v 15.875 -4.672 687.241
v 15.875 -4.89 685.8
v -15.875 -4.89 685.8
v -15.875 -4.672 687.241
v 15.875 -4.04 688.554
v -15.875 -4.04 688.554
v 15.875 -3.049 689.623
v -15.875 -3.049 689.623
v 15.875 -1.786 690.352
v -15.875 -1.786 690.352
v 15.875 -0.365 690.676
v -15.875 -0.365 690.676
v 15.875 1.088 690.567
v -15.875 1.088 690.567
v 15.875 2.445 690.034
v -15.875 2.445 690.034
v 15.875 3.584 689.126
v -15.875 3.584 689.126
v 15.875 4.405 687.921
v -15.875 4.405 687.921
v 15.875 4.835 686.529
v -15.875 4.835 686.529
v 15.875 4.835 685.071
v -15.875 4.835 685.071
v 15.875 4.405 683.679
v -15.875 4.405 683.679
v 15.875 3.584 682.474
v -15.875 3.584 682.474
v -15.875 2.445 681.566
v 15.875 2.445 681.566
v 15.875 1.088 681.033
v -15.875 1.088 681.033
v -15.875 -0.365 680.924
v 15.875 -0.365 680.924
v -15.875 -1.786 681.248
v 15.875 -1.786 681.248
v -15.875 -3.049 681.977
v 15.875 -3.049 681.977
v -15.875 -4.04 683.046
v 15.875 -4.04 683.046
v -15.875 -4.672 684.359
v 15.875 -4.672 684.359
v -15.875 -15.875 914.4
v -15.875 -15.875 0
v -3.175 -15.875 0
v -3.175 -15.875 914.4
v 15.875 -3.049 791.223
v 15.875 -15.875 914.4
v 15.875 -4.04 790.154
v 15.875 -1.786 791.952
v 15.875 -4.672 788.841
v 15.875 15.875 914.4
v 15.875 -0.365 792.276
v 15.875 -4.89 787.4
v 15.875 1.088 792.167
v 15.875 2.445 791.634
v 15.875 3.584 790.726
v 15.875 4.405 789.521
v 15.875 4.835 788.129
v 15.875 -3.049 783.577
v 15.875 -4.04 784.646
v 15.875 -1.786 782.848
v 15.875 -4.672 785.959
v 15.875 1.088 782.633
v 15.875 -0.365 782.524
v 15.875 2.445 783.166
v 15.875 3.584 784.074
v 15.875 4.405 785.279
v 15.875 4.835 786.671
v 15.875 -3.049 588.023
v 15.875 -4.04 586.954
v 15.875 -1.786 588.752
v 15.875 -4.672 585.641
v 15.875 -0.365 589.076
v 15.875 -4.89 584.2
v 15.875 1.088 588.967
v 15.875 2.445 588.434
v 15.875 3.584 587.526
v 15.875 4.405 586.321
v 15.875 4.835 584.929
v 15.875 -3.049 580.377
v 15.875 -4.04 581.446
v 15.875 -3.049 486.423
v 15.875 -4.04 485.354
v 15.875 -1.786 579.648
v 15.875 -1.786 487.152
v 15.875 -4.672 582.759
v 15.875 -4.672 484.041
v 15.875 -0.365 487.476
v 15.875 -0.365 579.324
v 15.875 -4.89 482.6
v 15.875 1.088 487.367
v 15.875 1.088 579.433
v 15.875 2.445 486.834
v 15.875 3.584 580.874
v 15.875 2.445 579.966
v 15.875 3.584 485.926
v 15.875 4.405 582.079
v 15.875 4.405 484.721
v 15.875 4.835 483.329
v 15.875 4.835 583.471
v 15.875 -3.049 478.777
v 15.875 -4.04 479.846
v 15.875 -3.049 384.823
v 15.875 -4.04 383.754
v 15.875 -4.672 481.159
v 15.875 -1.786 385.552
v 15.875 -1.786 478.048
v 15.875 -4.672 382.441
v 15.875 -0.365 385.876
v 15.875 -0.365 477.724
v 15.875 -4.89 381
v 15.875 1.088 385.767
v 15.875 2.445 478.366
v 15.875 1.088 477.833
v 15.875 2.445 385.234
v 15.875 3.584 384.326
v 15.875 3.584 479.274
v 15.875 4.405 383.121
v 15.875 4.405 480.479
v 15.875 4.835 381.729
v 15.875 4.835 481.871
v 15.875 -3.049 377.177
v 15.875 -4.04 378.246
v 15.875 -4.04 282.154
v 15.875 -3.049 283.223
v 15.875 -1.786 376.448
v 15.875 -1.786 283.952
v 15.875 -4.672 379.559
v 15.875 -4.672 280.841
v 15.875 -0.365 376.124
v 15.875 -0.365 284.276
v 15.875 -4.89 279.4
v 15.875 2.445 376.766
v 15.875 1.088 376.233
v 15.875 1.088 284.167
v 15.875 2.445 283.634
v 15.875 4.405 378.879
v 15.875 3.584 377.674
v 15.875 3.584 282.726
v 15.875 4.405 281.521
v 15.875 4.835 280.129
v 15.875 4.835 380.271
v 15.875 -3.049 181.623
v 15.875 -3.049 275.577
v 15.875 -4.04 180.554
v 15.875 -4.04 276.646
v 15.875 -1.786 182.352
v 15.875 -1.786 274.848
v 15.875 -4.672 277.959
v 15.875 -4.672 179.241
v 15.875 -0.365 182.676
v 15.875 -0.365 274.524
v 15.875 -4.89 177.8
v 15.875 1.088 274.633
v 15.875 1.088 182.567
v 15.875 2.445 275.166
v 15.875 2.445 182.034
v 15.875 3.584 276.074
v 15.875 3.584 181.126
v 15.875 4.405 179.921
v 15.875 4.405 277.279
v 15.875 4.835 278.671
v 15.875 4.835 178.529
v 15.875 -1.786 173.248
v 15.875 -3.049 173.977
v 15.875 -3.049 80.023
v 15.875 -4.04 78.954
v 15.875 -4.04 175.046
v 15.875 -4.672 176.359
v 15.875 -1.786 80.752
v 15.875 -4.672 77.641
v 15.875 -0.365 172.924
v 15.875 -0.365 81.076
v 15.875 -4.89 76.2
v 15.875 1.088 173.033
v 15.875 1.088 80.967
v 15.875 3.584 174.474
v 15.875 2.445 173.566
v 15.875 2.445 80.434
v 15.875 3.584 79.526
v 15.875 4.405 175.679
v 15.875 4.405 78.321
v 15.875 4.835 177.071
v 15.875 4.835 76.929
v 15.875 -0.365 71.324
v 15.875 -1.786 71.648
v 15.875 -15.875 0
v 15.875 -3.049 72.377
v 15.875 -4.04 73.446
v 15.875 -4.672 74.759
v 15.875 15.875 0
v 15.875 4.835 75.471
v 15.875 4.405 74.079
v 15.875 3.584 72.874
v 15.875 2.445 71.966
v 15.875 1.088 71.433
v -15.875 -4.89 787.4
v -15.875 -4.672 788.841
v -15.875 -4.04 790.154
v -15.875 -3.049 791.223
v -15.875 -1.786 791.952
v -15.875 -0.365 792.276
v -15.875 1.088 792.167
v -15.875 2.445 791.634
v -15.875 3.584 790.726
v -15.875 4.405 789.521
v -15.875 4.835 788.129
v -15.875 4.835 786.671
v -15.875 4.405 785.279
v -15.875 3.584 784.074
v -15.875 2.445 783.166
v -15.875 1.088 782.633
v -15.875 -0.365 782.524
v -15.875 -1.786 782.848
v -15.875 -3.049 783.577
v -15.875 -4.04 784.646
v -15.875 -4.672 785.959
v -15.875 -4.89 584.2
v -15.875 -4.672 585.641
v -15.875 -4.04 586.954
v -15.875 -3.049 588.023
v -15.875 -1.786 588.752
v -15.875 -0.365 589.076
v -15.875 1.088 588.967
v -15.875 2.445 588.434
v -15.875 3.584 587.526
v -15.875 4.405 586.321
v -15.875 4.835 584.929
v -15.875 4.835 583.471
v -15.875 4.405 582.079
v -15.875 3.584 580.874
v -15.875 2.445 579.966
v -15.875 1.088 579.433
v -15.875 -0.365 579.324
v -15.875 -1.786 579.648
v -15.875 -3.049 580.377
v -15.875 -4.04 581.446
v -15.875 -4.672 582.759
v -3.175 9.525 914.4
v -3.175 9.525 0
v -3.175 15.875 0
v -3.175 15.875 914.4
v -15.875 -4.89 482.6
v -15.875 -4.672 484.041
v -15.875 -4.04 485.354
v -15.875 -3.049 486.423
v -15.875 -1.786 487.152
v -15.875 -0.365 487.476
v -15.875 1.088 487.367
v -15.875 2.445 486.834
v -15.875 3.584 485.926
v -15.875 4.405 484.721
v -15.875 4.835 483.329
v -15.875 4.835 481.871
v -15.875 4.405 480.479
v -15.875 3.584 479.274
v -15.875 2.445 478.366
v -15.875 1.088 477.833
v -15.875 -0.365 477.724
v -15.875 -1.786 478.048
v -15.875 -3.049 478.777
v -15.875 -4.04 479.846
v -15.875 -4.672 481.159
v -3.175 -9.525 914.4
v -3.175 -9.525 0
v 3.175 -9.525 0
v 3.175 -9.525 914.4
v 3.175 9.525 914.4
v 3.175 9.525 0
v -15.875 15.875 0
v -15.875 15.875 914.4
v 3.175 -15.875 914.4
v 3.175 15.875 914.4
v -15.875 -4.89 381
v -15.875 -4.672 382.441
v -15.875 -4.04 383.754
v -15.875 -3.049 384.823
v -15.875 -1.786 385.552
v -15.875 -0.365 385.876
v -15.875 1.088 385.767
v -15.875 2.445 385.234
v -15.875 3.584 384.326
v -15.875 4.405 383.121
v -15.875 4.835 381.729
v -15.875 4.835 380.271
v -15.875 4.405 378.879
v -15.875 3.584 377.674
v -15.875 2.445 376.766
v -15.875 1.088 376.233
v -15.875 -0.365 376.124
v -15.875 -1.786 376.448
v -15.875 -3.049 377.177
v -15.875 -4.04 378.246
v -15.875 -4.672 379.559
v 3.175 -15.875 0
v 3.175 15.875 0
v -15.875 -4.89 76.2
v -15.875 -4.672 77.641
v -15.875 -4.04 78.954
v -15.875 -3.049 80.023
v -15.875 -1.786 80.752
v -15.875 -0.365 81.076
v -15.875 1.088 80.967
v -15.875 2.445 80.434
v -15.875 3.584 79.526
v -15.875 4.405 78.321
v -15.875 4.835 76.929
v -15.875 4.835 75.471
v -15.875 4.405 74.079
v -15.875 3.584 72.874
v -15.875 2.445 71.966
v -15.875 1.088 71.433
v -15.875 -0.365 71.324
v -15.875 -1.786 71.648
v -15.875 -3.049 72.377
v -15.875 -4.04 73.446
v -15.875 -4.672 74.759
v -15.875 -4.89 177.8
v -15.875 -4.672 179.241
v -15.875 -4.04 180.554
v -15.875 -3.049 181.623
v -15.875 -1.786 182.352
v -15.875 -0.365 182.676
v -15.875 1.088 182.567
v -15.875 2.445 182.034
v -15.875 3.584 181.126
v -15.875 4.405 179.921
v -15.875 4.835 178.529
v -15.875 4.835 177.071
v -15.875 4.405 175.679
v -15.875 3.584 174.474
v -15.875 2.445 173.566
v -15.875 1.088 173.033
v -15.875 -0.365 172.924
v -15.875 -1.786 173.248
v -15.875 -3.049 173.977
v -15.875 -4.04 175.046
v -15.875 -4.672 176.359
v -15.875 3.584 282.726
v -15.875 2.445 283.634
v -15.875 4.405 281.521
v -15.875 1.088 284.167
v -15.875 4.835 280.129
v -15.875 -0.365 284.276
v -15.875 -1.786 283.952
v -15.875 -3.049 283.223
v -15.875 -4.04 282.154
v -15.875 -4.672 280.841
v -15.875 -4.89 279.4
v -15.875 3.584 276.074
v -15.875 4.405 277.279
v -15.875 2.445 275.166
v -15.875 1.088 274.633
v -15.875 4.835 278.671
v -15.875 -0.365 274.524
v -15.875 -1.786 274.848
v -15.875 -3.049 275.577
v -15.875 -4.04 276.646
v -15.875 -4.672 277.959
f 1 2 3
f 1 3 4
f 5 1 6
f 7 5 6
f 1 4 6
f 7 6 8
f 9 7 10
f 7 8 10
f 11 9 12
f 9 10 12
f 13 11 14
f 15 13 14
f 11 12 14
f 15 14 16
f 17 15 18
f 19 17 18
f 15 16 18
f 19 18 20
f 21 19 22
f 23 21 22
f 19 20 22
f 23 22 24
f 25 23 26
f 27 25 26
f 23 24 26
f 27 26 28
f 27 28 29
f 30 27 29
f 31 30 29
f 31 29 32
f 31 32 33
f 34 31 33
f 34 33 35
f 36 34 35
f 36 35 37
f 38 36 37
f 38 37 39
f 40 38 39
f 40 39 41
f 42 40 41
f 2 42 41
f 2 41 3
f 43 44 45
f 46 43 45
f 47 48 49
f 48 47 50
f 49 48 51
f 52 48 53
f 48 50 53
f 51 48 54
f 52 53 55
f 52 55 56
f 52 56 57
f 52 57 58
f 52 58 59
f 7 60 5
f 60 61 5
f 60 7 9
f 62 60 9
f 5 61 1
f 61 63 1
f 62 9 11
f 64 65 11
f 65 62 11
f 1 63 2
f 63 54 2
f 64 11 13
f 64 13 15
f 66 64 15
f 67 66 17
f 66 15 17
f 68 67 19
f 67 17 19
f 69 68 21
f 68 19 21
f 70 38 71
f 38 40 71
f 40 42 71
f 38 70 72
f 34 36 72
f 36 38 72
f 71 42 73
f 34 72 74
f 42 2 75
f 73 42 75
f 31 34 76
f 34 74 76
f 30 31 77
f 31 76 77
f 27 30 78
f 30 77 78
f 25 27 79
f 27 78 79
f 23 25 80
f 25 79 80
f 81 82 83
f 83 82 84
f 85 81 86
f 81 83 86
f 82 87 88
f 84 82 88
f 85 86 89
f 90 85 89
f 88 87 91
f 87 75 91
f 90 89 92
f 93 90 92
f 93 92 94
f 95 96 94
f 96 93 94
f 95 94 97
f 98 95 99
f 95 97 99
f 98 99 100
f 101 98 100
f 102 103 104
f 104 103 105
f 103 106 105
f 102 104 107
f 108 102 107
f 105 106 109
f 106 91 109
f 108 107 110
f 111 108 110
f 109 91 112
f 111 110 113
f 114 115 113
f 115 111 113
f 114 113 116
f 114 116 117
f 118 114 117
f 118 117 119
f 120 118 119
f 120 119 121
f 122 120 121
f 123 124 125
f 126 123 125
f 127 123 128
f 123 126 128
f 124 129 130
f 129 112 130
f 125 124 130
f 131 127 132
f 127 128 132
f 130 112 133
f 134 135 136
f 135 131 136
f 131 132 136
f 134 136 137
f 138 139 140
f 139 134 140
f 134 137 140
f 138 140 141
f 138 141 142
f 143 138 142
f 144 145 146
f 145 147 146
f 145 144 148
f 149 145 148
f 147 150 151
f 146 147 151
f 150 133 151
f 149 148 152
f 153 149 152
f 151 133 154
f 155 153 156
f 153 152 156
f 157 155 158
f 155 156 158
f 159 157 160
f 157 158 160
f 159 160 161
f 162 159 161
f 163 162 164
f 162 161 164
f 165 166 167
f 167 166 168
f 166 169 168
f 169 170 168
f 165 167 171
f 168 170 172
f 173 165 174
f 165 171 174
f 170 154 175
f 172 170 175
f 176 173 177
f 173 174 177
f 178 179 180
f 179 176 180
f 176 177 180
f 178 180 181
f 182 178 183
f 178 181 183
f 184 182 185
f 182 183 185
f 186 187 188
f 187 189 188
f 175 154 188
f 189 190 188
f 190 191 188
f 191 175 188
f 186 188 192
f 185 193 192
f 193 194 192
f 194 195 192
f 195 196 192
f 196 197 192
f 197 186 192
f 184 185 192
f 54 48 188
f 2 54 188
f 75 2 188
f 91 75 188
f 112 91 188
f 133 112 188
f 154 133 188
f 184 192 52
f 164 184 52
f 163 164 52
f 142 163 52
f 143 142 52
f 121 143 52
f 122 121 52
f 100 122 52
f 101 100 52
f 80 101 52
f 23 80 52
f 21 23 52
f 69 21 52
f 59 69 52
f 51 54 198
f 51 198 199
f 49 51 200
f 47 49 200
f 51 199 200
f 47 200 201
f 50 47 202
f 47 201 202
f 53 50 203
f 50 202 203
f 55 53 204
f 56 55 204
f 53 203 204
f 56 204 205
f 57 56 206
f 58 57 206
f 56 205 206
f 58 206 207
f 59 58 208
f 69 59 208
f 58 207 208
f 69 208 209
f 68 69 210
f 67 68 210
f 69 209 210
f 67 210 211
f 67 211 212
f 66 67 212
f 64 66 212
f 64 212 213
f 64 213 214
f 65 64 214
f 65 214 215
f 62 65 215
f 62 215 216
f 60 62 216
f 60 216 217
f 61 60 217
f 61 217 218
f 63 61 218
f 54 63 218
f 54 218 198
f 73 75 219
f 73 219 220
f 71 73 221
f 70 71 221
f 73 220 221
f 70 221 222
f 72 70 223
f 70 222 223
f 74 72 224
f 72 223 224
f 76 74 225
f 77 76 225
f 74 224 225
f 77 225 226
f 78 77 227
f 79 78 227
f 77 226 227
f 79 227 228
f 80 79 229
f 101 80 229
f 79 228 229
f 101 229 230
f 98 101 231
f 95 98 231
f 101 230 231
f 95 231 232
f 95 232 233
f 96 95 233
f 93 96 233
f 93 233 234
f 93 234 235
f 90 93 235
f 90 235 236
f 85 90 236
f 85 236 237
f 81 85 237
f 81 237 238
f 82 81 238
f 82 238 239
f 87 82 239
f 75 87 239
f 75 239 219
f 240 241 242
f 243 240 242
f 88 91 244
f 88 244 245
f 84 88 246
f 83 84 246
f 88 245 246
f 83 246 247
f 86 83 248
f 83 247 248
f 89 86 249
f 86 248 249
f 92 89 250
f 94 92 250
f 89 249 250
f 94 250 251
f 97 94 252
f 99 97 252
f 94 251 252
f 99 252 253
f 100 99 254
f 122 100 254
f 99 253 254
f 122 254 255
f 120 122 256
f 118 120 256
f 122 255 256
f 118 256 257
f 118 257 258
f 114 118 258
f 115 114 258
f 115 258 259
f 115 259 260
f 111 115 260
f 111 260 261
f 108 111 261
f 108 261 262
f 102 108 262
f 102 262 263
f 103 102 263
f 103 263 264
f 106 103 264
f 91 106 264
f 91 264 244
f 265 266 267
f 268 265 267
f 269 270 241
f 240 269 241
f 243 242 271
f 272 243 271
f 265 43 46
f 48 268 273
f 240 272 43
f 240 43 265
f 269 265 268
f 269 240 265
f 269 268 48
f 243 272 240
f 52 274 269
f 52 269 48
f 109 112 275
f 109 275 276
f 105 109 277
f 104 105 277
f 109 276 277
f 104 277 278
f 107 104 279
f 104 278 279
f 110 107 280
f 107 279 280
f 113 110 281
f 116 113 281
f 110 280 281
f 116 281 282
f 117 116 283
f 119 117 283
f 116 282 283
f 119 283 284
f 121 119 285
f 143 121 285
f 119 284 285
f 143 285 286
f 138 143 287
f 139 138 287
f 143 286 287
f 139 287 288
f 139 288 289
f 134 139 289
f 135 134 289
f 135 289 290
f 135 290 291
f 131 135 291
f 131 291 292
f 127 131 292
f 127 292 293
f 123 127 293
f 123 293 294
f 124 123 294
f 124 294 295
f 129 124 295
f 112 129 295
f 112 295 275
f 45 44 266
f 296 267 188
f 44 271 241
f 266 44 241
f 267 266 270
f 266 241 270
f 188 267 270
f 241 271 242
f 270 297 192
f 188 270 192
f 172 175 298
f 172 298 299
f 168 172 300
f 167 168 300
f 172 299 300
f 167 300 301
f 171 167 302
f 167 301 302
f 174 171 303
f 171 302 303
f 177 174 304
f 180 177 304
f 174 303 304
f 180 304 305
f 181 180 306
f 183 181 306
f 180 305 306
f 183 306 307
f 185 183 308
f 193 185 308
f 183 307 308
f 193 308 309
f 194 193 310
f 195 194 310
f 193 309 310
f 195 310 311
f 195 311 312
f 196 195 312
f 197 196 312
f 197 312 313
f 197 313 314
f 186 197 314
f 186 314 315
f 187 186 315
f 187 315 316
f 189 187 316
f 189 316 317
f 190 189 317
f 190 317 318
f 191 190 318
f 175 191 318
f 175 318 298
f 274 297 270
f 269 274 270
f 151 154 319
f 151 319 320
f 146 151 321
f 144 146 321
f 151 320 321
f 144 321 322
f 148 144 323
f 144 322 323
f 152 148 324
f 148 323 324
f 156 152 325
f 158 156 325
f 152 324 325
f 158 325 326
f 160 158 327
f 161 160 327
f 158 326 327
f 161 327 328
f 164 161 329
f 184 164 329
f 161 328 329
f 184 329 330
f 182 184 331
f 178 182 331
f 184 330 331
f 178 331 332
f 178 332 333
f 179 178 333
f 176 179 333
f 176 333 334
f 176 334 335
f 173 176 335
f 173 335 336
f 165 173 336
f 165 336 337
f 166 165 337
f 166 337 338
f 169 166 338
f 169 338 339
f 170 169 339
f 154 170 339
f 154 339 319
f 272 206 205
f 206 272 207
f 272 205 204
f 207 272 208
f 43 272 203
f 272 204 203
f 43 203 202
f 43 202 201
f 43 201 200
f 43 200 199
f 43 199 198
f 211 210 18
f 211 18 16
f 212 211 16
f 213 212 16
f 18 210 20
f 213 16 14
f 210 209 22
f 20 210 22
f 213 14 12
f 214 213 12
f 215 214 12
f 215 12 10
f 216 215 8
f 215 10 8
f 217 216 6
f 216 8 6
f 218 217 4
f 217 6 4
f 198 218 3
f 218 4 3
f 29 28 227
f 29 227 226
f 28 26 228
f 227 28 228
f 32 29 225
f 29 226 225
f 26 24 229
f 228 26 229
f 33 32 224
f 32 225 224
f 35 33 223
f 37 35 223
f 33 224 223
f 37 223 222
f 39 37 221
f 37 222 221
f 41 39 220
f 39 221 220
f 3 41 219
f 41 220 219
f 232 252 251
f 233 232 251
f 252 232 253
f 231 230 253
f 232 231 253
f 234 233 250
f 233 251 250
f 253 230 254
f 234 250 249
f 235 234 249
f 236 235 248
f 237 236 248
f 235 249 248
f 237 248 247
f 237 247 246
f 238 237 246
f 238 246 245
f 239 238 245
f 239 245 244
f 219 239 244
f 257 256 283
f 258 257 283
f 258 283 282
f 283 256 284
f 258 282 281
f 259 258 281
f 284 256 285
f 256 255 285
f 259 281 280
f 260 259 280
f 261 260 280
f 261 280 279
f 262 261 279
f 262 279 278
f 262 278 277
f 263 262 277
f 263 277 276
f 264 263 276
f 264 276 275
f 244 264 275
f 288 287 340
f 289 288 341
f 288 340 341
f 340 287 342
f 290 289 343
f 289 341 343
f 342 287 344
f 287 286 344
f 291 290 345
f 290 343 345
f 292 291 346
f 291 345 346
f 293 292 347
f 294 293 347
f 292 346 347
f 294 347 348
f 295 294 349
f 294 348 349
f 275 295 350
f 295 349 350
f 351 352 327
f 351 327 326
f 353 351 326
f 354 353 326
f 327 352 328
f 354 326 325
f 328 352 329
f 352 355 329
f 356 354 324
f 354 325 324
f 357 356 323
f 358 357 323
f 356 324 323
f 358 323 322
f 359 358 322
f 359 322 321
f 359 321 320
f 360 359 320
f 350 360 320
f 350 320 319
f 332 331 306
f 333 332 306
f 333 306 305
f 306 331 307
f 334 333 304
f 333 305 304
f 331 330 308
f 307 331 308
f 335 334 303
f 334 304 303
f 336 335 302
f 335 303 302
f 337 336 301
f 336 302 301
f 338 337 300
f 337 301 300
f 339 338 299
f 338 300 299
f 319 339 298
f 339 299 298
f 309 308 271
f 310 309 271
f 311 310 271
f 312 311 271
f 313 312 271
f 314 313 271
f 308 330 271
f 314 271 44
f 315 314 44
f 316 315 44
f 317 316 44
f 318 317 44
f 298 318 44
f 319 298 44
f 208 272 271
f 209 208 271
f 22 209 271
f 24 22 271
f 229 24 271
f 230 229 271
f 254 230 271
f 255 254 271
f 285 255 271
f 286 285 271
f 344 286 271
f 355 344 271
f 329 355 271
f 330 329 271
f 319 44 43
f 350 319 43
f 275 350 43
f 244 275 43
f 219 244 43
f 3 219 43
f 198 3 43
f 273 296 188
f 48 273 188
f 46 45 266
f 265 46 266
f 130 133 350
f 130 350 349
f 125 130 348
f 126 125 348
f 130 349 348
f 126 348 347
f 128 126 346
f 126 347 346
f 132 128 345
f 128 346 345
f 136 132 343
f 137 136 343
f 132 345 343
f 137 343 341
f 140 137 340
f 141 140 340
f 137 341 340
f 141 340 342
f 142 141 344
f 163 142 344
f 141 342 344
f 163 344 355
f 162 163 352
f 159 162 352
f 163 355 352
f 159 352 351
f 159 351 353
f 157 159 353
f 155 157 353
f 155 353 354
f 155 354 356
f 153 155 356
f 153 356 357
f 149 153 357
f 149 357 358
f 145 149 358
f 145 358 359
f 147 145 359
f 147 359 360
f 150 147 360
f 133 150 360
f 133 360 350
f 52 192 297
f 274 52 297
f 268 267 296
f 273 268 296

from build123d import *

# Parameters (mm, degrees)
F1_DEPTH = 914.4
F2_R     = 4.8895
F3_DEPTH = 31.751


with BuildPart() as f1:
    # F0 (on Top) → F1 (new body)
    with BuildSketch(Plane.XY):
        Polygon((3.175, -15.875), (15.875, -15.875), (15.875, 15.875), (3.175, 15.875), (3.175, 9.525), (-3.175, 9.525), (-3.175, 15.875), (-15.875, 15.875), (-15.875, -15.875), (-3.175, -15.875), (-3.175, -9.525), (3.175, -9.525), align=None)
    extrude(amount=F1_DEPTH)

    # F2 (on face) → F3 (cut, through all)
    with BuildSketch(Plane(origin=(-15.875, 0, 0), x_dir=(0, -1, 0), z_dir=(-1, 0, 0))):
        with Locations((0, 787.4)):
            Circle(F2_R)
        with Locations((0, 685.8)):
            Circle(F2_R)
        with Locations((0, 584.2)):
            Circle(F2_R)
        with Locations((0, 482.6)):
            Circle(F2_R)
        with Locations((0, 381)):
            Circle(F2_R)
        with Locations((0, 279.4)):
            Circle(F2_R)
        with Locations((0, 177.8)):
            Circle(F2_R)
        with Locations((0, 76.2)):
            Circle(F2_R)
    extrude(amount=-F3_DEPTH, mode=Mode.SUBTRACT)


solid = f1.part
